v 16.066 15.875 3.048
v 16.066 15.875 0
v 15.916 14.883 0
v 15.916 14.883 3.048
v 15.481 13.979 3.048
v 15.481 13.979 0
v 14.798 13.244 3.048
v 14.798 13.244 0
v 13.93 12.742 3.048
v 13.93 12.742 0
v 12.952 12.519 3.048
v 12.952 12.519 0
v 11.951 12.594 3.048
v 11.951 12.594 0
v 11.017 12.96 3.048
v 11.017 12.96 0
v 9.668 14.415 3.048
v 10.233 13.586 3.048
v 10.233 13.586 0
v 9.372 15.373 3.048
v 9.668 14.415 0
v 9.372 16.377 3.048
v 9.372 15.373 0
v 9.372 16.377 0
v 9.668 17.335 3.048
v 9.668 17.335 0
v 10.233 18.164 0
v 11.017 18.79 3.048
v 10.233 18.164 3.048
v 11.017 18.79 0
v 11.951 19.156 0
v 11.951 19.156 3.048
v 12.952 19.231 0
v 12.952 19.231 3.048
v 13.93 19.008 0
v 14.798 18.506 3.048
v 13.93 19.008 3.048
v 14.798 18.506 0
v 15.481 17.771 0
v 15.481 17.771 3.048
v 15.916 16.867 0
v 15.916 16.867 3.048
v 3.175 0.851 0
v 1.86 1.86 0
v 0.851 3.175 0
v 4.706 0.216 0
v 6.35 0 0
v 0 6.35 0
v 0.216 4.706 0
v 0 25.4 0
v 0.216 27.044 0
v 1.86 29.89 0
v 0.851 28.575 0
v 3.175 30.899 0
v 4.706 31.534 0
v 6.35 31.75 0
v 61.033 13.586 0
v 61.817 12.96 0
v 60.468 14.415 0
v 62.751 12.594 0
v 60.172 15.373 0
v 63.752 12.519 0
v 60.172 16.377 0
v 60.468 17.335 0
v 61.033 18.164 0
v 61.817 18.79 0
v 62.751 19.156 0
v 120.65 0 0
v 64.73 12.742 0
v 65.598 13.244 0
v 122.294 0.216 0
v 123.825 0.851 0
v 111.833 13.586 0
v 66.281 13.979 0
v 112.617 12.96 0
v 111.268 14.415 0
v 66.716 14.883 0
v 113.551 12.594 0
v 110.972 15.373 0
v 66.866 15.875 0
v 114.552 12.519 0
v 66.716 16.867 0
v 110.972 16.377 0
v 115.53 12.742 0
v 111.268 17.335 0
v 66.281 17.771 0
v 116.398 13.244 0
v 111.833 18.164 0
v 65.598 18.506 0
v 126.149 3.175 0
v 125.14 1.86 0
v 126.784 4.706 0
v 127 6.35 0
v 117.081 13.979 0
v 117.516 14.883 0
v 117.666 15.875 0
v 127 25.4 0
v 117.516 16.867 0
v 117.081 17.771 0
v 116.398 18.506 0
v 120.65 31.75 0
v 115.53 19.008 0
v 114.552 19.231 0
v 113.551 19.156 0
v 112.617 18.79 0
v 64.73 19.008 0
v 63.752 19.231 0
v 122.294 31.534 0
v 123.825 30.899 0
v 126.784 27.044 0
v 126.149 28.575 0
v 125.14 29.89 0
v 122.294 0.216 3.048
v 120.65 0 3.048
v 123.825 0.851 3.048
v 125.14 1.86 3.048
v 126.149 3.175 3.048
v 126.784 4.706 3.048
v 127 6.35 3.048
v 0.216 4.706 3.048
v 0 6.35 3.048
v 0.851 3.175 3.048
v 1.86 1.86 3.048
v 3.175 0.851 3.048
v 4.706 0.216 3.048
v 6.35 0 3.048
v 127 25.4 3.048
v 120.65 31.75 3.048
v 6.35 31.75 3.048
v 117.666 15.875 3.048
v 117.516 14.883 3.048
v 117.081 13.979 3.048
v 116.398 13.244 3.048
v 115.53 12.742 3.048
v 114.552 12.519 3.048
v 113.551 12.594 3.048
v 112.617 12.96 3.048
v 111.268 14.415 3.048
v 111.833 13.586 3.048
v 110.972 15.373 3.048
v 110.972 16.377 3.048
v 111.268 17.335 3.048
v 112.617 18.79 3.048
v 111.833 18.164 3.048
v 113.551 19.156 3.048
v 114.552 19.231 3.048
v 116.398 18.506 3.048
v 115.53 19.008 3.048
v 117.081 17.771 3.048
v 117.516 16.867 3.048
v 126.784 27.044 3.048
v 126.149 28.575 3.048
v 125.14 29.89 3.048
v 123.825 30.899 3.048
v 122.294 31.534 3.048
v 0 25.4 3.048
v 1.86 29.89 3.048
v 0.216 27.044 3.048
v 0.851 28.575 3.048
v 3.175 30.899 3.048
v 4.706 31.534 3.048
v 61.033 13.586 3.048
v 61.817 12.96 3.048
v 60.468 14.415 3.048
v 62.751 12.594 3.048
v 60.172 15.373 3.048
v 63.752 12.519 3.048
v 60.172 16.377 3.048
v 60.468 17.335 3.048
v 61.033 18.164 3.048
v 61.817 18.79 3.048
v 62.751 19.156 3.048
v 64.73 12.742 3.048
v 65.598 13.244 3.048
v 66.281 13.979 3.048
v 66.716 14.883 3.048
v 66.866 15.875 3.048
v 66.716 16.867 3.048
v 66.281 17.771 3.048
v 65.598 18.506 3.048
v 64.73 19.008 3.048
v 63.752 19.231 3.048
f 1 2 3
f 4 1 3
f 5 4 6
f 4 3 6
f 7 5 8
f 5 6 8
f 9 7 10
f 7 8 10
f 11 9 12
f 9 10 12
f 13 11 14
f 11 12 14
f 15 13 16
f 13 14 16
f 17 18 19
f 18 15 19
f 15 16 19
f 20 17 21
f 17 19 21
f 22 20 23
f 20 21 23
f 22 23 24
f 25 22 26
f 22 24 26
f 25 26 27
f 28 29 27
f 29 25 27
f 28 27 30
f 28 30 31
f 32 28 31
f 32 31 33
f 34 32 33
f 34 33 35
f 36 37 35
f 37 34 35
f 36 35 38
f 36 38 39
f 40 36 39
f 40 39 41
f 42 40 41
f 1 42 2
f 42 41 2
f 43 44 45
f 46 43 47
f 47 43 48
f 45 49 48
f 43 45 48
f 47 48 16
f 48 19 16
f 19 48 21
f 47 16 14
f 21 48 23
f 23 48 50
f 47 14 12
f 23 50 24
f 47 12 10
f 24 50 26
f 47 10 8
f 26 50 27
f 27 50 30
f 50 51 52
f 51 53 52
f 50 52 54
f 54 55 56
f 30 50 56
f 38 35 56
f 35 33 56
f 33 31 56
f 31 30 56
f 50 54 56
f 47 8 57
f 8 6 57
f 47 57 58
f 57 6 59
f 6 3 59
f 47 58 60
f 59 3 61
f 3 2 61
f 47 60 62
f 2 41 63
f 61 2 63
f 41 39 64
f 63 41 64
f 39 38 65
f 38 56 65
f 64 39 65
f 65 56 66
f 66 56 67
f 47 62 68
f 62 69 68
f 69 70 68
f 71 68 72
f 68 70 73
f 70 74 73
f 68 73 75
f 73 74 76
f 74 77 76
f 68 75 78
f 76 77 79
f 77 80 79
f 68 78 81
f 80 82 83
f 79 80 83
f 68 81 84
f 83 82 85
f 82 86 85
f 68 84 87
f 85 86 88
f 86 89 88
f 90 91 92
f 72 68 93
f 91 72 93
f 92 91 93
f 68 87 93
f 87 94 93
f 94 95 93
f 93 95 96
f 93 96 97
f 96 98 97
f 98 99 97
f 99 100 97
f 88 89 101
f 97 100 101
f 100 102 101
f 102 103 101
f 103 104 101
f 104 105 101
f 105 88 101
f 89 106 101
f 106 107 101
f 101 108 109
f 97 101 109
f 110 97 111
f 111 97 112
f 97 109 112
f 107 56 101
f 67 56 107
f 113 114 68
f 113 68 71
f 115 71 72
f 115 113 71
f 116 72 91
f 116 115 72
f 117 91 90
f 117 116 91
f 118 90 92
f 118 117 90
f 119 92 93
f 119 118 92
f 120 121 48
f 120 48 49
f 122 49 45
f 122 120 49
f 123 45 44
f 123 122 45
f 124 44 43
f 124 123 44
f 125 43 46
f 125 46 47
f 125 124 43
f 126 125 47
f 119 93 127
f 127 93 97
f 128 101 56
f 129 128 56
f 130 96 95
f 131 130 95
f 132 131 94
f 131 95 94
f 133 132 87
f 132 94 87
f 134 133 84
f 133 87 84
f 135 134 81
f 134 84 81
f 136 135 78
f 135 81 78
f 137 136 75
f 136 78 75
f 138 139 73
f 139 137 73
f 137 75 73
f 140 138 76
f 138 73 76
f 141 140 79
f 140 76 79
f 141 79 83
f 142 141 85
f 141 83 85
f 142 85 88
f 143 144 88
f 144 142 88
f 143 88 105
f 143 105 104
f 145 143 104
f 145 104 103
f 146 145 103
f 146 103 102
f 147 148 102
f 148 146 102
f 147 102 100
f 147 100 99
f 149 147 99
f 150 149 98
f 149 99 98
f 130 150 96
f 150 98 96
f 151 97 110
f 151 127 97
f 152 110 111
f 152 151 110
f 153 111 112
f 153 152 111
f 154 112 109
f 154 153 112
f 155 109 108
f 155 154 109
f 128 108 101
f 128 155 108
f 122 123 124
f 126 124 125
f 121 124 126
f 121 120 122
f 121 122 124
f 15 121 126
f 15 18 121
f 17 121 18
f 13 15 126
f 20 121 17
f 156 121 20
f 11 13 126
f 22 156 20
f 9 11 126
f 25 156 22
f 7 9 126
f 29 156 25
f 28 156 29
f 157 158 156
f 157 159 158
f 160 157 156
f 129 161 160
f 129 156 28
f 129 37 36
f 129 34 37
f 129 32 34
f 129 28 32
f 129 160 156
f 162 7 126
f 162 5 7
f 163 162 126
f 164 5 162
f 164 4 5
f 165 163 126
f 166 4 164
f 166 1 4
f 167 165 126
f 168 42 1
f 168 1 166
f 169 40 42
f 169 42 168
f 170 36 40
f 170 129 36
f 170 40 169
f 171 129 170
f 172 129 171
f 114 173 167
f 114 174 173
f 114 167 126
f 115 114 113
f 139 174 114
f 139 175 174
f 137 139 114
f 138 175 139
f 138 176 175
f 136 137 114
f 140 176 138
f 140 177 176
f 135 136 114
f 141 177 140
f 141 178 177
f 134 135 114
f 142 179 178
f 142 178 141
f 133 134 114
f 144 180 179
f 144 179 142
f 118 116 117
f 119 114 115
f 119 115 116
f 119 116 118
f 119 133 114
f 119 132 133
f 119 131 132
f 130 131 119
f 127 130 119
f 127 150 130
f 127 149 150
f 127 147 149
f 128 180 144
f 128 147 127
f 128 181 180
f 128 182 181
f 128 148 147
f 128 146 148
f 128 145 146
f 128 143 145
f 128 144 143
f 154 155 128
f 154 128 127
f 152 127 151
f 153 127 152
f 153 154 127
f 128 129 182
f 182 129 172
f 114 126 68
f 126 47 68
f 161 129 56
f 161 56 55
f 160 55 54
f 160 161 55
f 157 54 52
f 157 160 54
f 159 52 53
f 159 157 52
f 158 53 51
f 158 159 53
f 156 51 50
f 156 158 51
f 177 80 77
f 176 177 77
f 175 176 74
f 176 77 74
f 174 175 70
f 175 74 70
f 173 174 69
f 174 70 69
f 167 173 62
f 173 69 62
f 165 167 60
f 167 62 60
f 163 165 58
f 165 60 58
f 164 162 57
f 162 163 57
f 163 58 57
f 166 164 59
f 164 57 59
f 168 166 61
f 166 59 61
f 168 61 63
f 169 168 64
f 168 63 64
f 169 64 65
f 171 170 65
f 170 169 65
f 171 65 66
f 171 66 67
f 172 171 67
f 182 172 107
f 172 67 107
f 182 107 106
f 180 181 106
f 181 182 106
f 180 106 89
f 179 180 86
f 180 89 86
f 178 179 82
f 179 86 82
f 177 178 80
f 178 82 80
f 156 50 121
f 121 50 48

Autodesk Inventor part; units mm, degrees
ref_plane "YZ Plane" through (0, 0, 0) normal (1, 0, 0) x (0, 1, 0)
ref_plane "XZ Plane" through (0, 0, 0) normal (0, 1, 0) x (-1, 0, 0)
ref_plane "XY Plane" through (0, 0, 0) normal (0, 0, 1) x (1, 0, 0)
sketch "Sketch1" plane through (0, 0, 0) normal (0, 0, 1) x (1, 0, 0)
  line L0 (0, 0) -> (127, 0)
  line L1 (127, 0) -> (127, 31.75)
  line L2 (127, 31.75) -> (0, 31.75)
  line L3 (0, 31.75) -> (0, 0)
  circle A0 centre (114.3, 15.875) radius 3.3655
  circle A1 centre (63.5, 15.875) radius 3.3655
  circle A2 centre (12.7, 15.875) radius 3.3655
  dimension "d0" = 127
  dimension "d1" = 31.75
  dimension "d2" = 6.731
  dimension "d3" = 12.7
  dimension "d4" = 15.875
  dimension "d7" = 50.8
extrude "Plate1" add sketch "Sketch1" along normal blind 3.048
fillet "Corner Round1" radius 6.35 4 edges at (0, 31.75, 1.524) (0, 0, 1.524) (127, 31.75, 1.524) (127, 0, 1.524)
equation "\"d4\" = 0.5 * d1"
equation "\"BendRadius\" = Thickness"
equation "\"BendReliefWidth\" = Thickness"
equation "\"BendReliefDepth\" = 0.5 * Thickness"
equation "\"CornerReliefSize\" = 4 * Thickness"
equation "\"MinimumRemnant\" = 2 * Thickness"
equation "\"TransitionRadius\" = BendRadius"
equation "\"JacobiRadiusSize\" = BendRadius"
equation "\"GapSize\" = Thickness"
equation "\"d12\" = BendRadius"
equation "\"Thickness\" = 3.048"
properties part number "Super1"
